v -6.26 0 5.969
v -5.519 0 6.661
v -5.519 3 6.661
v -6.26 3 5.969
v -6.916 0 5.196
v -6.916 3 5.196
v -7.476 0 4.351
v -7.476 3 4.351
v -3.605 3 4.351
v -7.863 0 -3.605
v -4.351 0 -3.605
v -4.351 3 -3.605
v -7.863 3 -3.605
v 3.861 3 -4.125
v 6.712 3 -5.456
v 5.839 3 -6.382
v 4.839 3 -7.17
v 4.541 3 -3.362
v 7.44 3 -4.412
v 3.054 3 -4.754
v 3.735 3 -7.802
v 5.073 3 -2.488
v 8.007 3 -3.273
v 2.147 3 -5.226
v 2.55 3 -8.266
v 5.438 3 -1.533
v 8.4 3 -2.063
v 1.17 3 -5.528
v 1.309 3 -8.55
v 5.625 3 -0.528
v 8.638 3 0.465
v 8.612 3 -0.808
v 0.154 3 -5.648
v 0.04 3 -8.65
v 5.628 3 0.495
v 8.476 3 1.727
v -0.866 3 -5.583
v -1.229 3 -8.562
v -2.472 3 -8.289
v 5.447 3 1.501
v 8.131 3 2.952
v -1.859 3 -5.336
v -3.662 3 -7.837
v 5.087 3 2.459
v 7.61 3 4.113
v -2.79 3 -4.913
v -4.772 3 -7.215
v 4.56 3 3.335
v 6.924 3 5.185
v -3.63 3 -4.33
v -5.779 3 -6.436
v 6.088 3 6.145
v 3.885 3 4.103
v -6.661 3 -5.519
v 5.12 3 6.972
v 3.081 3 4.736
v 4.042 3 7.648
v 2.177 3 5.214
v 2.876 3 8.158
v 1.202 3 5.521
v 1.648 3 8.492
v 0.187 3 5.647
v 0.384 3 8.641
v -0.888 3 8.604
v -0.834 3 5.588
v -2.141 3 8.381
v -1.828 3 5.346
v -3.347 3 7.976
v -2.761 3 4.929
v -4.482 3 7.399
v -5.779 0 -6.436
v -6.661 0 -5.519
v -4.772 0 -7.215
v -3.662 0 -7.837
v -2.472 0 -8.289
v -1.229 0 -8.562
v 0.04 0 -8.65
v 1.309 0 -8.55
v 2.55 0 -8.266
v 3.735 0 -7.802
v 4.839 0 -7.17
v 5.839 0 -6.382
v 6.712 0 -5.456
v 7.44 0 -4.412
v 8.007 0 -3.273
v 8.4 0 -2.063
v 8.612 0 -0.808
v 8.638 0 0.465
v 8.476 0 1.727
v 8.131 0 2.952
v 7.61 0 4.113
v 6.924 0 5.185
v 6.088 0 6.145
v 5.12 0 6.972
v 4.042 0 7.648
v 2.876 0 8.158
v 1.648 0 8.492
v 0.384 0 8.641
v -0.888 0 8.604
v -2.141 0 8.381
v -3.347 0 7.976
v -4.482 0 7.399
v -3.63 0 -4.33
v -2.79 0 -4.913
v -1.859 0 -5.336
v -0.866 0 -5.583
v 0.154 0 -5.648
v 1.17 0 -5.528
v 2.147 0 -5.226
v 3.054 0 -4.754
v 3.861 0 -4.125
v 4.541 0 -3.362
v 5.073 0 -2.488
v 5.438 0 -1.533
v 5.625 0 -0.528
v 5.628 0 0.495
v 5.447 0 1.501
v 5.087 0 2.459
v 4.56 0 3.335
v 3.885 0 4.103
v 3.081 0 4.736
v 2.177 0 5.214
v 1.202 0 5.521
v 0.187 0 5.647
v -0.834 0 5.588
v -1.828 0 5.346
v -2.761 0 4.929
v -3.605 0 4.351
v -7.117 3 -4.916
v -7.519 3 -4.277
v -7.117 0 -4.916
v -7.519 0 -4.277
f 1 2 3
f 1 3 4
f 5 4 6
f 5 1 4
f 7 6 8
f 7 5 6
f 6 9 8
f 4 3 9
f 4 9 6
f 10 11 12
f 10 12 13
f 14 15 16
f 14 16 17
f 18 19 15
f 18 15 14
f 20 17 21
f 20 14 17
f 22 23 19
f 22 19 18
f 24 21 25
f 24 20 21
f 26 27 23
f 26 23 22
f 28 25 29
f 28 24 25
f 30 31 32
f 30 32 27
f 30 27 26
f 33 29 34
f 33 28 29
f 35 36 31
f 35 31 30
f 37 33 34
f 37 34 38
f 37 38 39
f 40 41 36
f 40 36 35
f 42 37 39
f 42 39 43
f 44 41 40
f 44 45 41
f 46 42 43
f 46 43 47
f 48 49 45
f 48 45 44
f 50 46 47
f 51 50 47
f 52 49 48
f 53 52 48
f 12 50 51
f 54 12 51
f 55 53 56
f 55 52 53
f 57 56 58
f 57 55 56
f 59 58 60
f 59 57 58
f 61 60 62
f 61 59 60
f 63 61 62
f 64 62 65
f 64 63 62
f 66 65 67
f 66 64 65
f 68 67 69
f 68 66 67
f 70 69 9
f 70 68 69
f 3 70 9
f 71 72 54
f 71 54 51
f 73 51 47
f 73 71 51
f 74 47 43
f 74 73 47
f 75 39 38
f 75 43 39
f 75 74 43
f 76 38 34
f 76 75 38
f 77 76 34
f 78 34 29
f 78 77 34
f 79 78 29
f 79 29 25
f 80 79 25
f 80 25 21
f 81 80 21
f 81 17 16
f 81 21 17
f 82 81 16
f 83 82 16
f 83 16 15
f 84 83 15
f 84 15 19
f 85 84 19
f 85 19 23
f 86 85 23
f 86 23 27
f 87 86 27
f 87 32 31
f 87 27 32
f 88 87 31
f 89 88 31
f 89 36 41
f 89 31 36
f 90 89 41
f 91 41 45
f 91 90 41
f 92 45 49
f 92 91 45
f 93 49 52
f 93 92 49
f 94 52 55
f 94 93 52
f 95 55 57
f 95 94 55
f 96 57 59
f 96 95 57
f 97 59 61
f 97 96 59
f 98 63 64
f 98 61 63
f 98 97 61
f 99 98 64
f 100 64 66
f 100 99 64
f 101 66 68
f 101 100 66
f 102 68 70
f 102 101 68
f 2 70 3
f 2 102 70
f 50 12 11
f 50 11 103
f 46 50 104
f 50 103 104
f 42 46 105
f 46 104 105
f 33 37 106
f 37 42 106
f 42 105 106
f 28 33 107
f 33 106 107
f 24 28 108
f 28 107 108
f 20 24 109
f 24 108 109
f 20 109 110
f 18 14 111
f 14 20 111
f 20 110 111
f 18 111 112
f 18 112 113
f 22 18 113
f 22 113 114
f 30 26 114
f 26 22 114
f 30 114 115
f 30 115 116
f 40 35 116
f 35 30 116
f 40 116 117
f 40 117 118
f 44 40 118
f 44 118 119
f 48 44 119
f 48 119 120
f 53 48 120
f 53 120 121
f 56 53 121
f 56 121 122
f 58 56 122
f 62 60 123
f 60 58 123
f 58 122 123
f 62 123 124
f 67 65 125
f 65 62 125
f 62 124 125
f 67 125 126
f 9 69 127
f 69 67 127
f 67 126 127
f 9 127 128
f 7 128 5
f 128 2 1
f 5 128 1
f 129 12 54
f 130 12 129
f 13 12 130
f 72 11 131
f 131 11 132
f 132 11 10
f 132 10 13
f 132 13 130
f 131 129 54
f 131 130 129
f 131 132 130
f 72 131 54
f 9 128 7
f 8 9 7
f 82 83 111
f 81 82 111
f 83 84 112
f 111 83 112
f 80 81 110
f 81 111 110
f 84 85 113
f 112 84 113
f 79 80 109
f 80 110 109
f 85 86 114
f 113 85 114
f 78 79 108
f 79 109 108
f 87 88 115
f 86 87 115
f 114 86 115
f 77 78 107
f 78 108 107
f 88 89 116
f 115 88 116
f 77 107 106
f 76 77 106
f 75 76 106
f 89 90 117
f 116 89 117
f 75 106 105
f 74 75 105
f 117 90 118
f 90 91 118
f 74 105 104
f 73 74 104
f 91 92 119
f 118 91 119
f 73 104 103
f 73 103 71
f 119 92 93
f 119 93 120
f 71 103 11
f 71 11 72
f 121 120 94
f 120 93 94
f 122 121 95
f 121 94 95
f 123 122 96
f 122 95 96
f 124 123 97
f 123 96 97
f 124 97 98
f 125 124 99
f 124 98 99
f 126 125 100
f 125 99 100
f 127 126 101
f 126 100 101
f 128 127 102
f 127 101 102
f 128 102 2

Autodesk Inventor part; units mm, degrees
ref_plane "YZ Plane" through (0, 0, 0) normal (1, 0, 0) x (0, 1, 0)
ref_plane "XZ Plane" through (0, 0, 0) normal (0, 1, 0) x (-1, 0, 0)
ref_plane "XY Plane" through (0, 0, 0) normal (0, 0, 1) x (1, 0, 0)
sketch "Boceto1" plane through (0, 0, 0) normal (0, 1, 0) x (-1, 0, 0)
  circle A0 centre (0, 0) radius 5.65
  circle A1 centre (0, 0) radius 8.65
  line L0 (0, 0) -> (6.6609, -5.5186)
  line L1 (0, 0) -> (5.5186, 6.6609)
  line L2 (3.6046, 4.3508) -> (7.4762, 4.3508)
  line L3 (4.3508, -3.6046) -> (7.8632, -3.6046)
  point P0 (-0.8522, 8.6079)
  point P1 (-0.8522, -8.6079)
  point P2 (3.6046, 4.3508)
  point P3 (4.3508, -3.6046)
  dimension "d0" = 11.3
  dimension "d1" = 3
  dimension "d5" = 90
extrude "Extrusión1" add sketch "Boceto1" along normal blind 3 contours A0 L0 A1 L1 | L1 A1 L2 | L3 A1 L0
properties part number "Rubberfoot" material "Caucho, Silicona"
